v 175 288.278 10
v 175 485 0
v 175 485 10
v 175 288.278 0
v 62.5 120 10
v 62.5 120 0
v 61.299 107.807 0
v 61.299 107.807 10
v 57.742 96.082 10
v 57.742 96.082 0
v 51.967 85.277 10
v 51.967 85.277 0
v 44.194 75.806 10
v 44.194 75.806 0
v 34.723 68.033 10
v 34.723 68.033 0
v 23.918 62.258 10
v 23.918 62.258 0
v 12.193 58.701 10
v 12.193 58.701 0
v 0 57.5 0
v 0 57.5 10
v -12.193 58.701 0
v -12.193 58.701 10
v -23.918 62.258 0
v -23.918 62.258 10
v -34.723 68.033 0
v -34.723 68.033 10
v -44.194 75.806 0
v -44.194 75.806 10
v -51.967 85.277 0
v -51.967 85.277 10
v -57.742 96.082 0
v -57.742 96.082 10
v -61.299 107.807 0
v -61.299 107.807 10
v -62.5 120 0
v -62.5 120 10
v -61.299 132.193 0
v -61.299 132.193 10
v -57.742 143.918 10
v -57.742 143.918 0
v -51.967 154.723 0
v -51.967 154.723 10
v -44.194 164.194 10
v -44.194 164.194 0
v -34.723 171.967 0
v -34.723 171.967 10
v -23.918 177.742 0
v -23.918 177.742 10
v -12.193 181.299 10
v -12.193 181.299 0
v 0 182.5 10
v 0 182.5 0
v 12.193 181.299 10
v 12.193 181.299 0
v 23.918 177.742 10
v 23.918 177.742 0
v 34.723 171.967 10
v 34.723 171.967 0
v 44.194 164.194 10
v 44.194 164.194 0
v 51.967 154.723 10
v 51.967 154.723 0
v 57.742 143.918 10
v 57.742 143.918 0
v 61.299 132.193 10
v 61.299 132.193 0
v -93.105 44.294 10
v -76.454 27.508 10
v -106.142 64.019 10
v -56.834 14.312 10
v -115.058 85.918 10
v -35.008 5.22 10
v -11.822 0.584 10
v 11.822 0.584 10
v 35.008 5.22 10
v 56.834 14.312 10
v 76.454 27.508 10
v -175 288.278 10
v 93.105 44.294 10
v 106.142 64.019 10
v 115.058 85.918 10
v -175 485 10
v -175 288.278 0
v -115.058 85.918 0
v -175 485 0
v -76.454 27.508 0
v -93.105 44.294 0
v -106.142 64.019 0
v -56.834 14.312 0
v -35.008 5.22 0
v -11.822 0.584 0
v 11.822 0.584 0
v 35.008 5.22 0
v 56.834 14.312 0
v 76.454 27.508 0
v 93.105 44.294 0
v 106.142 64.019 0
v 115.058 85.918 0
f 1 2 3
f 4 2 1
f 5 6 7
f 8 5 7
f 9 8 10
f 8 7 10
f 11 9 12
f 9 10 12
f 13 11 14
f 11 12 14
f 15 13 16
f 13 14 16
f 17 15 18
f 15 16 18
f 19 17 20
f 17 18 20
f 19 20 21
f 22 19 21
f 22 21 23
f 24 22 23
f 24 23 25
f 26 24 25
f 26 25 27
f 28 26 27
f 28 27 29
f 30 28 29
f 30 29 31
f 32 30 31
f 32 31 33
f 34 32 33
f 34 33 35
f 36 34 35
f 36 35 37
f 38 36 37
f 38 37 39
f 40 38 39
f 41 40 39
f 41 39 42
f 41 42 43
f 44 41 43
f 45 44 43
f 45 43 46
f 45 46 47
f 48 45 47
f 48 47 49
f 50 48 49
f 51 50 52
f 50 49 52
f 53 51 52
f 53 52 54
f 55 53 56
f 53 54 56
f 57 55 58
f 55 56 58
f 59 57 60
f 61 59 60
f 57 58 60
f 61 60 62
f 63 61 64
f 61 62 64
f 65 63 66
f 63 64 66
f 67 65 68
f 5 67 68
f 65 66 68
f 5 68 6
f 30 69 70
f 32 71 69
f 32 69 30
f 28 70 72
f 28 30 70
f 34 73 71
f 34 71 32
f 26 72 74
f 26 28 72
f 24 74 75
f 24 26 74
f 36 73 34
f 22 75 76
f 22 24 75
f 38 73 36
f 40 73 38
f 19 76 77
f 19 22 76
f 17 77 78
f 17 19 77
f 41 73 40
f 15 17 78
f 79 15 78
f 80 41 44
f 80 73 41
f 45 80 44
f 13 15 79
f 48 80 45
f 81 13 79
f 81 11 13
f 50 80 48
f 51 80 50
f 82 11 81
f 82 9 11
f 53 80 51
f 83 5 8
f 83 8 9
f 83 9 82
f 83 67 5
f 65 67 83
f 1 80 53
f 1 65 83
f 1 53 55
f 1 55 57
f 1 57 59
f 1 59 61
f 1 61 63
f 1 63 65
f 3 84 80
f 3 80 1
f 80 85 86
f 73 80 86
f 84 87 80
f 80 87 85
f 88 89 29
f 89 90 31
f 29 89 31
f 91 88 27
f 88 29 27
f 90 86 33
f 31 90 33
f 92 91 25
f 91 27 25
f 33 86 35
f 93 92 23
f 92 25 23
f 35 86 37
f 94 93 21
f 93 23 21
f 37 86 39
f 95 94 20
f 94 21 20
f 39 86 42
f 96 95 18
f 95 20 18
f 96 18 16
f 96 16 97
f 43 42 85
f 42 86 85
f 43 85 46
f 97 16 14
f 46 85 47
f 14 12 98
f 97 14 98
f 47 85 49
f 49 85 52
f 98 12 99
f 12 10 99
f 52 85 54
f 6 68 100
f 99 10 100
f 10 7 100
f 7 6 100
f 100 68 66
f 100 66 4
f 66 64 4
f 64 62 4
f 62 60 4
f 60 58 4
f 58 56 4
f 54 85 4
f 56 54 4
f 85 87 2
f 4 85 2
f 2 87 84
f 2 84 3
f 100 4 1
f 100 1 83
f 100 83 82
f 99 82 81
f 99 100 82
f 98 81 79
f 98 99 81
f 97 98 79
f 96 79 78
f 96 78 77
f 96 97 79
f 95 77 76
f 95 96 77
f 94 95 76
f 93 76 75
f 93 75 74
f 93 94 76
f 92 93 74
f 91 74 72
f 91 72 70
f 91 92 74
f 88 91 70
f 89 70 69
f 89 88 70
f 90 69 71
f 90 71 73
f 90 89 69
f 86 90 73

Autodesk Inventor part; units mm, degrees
ref_plane "YZ Plane" through (0, 0, 0) normal (1, 0, 0) x (0, 1, 0)
ref_plane "XZ Plane" through (0, 0, 0) normal (0, 1, 0) x (-1, 0, 0)
ref_plane "XY Plane" through (0, 0, 0) normal (0, 0, 1) x (1, 0, 0)
sketch "Sketch1" plane through (0, 0, 0) normal (0, 0, 1) x (1, 0, 0)
  line L0 (0, 0) -> (0, 485)
  line L1 (-175, 485) -> (175, 485)
  circle A0 centre (0, 120) radius 62.5
  circle A1 centre (0, 120) radius 120
  line L2 (-175, 485) -> (-175, 288.2777)
  line L3 (-175, 288.2777) -> (-115.0584, 85.9182)
  line L4 (175, 485) -> (175, 288.2777)
  line L5 (175, 288.2777) -> (115.0584, 85.9182)
  dimension "d0" = 485
  dimension "d1" = 350
  dimension "d2" = 125
  dimension "d4" = 196.7223
  dimension "d16" = 33
  dimension "d17" = 240
extrude "Plate1" add sketch "Sketch1" along normal blind 10 contours A1 L0 A0 | L0 A0 A1 | L3 L2 L1 L0 A1 | A1 L0 L1 L4 L5
sketch "Sketch2" plane through (-175, 476.3397, 5) normal (0, 0.866, -0.5) x (-1, 0, 0)
  line L0 (-350, 0) -> (0, 0)
  line L1 (0, 0) -> (0, 40)
  line L2 (0, 40) -> (-350, 40)
  line L3 (-350, 40) -> (-350, 0)
equation "\"d2\" = back_steel_circle_проходной_диаметр"
equation "\"d5\" = Thickness"
equation "\"BendReliefDepth\" = 0.5 * Thickness"
equation "\"back_steel_circle_проходной_диаметр\" = 125"
equation "\"Thickness\" = 10"
properties part number "NVPH-301 back side"
